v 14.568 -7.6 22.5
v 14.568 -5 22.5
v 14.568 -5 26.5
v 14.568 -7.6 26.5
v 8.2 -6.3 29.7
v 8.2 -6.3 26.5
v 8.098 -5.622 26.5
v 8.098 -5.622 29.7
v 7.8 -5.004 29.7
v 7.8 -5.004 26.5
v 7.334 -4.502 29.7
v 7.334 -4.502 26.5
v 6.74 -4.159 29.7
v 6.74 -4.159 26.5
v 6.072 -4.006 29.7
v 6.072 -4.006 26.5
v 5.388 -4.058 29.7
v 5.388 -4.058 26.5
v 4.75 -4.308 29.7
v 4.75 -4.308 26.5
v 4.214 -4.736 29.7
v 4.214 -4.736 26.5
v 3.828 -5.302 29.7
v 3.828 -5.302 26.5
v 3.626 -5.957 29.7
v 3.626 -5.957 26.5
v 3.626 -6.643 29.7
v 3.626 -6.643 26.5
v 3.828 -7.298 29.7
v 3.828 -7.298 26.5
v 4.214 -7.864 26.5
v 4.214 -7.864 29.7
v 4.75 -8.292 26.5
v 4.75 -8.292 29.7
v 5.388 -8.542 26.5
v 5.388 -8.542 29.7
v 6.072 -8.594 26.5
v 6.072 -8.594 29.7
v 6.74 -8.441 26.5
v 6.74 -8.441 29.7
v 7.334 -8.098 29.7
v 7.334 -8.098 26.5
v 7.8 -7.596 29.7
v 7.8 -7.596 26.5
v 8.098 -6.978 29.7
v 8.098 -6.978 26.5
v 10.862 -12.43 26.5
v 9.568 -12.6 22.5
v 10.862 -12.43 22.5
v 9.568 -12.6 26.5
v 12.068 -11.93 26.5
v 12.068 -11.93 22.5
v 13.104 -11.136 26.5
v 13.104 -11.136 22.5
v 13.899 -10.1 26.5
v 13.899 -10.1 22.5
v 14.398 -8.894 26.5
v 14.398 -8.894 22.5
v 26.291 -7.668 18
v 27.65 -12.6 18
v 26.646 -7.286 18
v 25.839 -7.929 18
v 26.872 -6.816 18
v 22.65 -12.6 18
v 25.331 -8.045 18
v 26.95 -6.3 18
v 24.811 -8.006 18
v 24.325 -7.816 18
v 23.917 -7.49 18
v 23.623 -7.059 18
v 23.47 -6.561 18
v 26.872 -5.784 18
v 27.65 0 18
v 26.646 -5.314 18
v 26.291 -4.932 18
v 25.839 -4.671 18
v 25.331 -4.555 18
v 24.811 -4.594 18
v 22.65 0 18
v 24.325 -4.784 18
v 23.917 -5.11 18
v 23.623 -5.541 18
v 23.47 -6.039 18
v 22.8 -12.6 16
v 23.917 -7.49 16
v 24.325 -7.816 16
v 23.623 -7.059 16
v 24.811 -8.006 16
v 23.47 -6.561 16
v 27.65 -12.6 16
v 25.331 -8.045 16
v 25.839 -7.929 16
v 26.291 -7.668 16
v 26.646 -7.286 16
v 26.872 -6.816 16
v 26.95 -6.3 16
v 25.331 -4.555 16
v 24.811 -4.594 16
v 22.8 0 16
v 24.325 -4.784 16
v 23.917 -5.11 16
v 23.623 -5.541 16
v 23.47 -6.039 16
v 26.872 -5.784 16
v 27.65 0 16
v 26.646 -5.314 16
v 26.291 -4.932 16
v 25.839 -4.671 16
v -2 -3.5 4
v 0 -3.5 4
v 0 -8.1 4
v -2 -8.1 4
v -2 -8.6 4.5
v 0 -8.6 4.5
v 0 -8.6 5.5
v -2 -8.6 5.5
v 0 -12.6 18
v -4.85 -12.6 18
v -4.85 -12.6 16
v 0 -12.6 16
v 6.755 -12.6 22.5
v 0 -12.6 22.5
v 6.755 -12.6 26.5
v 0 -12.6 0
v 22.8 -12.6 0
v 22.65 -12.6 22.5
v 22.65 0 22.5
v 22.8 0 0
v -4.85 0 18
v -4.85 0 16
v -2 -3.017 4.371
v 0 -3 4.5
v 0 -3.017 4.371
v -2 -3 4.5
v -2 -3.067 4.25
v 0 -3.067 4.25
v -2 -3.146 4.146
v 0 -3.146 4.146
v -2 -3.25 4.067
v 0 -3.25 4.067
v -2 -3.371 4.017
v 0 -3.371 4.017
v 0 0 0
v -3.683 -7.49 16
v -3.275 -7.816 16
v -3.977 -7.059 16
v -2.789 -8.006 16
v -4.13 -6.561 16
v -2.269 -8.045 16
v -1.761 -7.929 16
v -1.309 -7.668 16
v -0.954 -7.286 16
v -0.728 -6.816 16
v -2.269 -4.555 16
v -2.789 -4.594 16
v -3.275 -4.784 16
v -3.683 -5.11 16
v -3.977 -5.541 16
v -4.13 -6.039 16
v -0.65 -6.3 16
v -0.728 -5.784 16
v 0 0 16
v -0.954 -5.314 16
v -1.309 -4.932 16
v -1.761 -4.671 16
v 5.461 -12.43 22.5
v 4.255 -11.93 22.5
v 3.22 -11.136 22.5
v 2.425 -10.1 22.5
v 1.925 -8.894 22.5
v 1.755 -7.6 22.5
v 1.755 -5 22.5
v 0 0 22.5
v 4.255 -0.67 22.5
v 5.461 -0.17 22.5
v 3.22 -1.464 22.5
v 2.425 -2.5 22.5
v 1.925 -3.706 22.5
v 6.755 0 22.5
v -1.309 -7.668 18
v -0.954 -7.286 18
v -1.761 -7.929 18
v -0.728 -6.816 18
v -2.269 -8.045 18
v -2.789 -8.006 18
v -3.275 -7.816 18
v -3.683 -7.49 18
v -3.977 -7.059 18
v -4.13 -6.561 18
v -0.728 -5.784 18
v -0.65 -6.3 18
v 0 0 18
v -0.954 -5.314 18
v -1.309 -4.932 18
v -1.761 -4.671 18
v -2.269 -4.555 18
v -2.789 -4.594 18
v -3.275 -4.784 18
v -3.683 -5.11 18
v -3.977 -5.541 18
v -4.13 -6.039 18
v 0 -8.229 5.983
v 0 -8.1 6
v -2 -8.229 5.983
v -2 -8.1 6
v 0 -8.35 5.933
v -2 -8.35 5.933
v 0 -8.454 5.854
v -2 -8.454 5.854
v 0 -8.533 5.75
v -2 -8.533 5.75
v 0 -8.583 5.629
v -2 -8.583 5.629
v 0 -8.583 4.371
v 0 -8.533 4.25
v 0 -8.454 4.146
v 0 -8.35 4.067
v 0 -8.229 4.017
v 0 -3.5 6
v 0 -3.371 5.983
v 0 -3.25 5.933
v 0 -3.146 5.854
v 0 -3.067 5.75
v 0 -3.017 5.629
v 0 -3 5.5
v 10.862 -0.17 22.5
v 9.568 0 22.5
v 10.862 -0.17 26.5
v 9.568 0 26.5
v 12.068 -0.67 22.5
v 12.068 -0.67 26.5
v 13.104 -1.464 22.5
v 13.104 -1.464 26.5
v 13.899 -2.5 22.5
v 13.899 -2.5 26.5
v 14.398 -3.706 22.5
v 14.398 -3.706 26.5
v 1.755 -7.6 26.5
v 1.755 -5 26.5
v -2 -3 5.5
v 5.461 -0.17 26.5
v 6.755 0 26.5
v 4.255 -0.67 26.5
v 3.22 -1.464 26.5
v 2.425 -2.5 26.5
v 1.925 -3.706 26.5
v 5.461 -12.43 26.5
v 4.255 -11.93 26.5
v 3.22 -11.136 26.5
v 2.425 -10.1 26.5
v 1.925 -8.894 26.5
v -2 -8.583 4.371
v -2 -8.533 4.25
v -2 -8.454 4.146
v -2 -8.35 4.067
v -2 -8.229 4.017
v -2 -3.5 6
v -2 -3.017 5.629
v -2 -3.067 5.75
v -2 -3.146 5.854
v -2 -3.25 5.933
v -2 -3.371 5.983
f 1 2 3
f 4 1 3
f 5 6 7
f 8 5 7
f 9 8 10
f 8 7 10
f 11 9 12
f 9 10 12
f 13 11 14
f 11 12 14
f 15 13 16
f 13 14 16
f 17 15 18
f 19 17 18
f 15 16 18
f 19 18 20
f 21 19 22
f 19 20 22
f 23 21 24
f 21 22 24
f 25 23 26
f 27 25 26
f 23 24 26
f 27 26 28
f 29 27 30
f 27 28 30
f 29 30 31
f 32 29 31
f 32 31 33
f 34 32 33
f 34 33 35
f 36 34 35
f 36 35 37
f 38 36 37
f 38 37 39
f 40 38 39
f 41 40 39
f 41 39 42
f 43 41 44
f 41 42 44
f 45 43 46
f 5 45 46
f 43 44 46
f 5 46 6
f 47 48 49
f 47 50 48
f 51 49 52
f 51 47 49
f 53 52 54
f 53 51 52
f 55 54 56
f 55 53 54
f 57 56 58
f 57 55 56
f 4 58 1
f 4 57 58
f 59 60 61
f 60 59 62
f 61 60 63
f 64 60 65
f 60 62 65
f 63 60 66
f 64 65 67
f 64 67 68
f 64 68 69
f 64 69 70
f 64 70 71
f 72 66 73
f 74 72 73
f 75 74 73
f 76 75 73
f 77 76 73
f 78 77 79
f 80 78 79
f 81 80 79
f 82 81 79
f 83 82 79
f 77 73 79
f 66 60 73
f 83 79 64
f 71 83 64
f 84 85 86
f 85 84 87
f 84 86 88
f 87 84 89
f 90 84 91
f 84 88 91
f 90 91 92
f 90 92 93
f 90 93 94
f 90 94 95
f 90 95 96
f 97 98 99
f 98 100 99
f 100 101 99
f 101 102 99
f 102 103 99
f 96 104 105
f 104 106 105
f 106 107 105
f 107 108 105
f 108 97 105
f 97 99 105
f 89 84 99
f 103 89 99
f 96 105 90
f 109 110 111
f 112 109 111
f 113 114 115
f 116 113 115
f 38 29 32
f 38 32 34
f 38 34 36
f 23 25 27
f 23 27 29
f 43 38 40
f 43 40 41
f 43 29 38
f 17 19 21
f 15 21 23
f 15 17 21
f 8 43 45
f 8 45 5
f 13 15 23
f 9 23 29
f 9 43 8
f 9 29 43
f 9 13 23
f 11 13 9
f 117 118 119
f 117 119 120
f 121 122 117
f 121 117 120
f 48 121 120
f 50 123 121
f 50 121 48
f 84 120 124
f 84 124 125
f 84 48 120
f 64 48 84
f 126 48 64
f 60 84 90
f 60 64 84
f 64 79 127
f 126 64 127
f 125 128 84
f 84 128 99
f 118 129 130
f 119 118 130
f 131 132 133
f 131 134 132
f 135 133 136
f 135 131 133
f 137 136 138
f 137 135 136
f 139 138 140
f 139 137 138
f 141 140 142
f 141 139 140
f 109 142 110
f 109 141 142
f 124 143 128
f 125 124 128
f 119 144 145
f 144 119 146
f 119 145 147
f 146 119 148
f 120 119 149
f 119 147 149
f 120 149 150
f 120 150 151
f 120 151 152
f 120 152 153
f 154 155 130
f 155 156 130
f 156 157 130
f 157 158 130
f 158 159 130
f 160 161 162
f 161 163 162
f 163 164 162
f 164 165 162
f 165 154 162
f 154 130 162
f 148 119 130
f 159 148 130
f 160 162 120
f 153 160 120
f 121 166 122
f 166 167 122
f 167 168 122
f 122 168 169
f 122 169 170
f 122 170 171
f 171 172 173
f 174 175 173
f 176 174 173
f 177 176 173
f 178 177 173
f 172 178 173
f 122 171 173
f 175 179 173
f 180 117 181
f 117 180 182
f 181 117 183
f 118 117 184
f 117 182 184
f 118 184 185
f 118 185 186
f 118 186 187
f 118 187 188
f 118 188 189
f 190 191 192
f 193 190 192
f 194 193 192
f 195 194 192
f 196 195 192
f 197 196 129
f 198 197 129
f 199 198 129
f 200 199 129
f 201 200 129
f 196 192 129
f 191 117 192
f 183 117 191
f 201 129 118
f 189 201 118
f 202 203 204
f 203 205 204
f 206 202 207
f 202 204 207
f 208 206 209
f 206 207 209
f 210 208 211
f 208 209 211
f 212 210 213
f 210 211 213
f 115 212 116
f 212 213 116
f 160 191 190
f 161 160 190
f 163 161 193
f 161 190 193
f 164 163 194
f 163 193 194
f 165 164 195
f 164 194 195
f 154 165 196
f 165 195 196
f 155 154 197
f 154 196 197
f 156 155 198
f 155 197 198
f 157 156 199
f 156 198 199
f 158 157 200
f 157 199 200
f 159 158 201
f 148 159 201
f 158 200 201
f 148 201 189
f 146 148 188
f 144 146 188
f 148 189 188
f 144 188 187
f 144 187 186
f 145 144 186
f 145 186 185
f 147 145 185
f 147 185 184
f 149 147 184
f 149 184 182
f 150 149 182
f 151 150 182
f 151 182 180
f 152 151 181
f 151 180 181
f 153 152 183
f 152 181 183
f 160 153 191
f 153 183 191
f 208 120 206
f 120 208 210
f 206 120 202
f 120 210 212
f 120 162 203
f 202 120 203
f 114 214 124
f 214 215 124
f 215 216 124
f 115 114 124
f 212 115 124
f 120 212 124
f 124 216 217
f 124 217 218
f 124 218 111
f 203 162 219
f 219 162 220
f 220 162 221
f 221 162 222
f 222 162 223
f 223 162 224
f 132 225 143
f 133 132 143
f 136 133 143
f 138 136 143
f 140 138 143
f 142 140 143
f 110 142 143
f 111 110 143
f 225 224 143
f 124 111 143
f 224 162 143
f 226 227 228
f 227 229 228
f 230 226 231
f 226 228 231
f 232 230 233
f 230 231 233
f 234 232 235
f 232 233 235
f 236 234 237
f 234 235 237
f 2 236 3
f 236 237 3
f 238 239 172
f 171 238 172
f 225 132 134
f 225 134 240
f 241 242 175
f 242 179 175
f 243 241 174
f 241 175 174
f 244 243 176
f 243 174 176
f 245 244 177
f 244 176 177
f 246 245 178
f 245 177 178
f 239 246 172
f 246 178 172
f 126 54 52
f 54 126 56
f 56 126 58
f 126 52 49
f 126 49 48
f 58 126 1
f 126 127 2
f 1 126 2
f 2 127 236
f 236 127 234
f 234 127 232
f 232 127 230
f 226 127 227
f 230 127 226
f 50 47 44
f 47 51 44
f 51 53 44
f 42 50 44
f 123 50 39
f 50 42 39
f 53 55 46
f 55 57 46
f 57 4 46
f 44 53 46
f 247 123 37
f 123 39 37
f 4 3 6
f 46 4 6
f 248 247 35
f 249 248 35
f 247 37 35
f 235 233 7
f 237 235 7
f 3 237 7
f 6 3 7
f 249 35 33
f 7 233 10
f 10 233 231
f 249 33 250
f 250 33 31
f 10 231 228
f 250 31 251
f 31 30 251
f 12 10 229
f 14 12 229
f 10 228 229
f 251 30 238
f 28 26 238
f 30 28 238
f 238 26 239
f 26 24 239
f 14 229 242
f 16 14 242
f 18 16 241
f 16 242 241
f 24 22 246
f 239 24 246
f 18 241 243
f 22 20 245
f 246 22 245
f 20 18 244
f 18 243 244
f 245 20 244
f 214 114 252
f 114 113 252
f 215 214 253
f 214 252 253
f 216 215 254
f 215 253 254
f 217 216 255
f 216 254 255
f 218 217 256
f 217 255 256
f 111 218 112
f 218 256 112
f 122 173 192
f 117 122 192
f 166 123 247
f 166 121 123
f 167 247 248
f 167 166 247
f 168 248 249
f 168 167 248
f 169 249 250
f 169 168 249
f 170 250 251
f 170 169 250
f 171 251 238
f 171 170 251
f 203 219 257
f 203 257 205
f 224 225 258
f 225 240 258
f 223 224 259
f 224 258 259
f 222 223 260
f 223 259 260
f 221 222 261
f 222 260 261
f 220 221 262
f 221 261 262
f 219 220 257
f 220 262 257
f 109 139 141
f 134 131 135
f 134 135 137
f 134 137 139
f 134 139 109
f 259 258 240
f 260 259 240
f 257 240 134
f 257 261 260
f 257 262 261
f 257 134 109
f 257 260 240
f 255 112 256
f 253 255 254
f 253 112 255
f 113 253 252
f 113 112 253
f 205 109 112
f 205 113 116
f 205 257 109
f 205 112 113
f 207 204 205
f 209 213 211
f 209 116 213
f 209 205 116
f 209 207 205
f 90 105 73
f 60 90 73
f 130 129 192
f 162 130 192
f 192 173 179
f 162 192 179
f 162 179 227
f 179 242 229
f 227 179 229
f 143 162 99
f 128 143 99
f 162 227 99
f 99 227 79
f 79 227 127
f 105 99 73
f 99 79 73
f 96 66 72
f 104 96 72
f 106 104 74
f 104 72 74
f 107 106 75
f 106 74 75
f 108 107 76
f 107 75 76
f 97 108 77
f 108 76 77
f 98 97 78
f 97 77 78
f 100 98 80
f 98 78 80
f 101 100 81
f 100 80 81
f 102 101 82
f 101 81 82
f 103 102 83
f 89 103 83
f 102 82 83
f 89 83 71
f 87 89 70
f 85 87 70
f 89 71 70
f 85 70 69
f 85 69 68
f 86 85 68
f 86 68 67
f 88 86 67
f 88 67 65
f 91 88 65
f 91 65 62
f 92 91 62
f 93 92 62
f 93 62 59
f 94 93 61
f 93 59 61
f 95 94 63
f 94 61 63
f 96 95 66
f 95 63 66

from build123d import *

# Parameters (mm, degrees)
F1_DEPTH = 12.6
F2_R     = 1.75
F3_DEPTH = 2
F4_R     = 2.3
F5_DEPTH = 3.2
F6_R     = 5
F7_W     = 5.6
F7_H     = 2
F8_DEPTH = 2
F9_R     = 0.5


with BuildPart() as f1:
    # F0 (on Front) → F1 (new body)
    with BuildSketch(Plane.XZ):
        Polygon((-4.85, 16), (0, 16), (0, 0), (22.8, 0), (22.8, 16), (27.65, 16), (27.65, 18), (22.65, 18), (22.65, 22.5), (14.568375, 22.5), (14.568375, 26.5), (1.7551, 26.5), (1.7551, 22.5), (0, 22.5), (0, 18), (-4.85, 18), align=None)
    extrude(amount=F1_DEPTH)

    # F2 (on face) → F3 (cut, through all)
    with BuildSketch(Plane.XY.offset(18)):
        with Locations((-2.4, -6.3)):
            Circle(F2_R)
        with Locations((25.2, -6.3)):
            Circle(F2_R)
    extrude(amount=-F3_DEPTH, mode=Mode.SUBTRACT)

    # F4 (on face) → F5 (join)
    with BuildSketch(Plane.XY.offset(26.5)):
        with Locations((5.9, -6.3)):
            Circle(F4_R)
    extrude(amount=F5_DEPTH)

    # F6
    f6_edges = [f1.edges().sort_by_distance(p)[0] for p in [
        (14.568375, 0, 24.5),
        (14.568375, -12.6, 24.5),
        (1.7551, -12.6, 24.5),
        (1.7551, 0, 24.5),
    ]]
    fillet(f6_edges, radius=F6_R)

    # F7 (on face) → F8 (join)
    with BuildSketch(Plane(origin=(0, 0, 0), x_dir=(0, -1, 0), z_dir=(-1, 0, 0))):
        with Locations((5.8, 5)):
            Rectangle(F7_W, F7_H)
    extrude(amount=F8_DEPTH)

    # F9
    f9_edges = [f1.edges().sort_by_distance(p)[0] for p in [
        (-1, -8.6, 6),
        (-1, -3, 6),
        (-1, -3, 4),
        (-1, -8.6, 4),
    ]]
    fillet(f9_edges, radius=F9_R)


solid = f1.part
